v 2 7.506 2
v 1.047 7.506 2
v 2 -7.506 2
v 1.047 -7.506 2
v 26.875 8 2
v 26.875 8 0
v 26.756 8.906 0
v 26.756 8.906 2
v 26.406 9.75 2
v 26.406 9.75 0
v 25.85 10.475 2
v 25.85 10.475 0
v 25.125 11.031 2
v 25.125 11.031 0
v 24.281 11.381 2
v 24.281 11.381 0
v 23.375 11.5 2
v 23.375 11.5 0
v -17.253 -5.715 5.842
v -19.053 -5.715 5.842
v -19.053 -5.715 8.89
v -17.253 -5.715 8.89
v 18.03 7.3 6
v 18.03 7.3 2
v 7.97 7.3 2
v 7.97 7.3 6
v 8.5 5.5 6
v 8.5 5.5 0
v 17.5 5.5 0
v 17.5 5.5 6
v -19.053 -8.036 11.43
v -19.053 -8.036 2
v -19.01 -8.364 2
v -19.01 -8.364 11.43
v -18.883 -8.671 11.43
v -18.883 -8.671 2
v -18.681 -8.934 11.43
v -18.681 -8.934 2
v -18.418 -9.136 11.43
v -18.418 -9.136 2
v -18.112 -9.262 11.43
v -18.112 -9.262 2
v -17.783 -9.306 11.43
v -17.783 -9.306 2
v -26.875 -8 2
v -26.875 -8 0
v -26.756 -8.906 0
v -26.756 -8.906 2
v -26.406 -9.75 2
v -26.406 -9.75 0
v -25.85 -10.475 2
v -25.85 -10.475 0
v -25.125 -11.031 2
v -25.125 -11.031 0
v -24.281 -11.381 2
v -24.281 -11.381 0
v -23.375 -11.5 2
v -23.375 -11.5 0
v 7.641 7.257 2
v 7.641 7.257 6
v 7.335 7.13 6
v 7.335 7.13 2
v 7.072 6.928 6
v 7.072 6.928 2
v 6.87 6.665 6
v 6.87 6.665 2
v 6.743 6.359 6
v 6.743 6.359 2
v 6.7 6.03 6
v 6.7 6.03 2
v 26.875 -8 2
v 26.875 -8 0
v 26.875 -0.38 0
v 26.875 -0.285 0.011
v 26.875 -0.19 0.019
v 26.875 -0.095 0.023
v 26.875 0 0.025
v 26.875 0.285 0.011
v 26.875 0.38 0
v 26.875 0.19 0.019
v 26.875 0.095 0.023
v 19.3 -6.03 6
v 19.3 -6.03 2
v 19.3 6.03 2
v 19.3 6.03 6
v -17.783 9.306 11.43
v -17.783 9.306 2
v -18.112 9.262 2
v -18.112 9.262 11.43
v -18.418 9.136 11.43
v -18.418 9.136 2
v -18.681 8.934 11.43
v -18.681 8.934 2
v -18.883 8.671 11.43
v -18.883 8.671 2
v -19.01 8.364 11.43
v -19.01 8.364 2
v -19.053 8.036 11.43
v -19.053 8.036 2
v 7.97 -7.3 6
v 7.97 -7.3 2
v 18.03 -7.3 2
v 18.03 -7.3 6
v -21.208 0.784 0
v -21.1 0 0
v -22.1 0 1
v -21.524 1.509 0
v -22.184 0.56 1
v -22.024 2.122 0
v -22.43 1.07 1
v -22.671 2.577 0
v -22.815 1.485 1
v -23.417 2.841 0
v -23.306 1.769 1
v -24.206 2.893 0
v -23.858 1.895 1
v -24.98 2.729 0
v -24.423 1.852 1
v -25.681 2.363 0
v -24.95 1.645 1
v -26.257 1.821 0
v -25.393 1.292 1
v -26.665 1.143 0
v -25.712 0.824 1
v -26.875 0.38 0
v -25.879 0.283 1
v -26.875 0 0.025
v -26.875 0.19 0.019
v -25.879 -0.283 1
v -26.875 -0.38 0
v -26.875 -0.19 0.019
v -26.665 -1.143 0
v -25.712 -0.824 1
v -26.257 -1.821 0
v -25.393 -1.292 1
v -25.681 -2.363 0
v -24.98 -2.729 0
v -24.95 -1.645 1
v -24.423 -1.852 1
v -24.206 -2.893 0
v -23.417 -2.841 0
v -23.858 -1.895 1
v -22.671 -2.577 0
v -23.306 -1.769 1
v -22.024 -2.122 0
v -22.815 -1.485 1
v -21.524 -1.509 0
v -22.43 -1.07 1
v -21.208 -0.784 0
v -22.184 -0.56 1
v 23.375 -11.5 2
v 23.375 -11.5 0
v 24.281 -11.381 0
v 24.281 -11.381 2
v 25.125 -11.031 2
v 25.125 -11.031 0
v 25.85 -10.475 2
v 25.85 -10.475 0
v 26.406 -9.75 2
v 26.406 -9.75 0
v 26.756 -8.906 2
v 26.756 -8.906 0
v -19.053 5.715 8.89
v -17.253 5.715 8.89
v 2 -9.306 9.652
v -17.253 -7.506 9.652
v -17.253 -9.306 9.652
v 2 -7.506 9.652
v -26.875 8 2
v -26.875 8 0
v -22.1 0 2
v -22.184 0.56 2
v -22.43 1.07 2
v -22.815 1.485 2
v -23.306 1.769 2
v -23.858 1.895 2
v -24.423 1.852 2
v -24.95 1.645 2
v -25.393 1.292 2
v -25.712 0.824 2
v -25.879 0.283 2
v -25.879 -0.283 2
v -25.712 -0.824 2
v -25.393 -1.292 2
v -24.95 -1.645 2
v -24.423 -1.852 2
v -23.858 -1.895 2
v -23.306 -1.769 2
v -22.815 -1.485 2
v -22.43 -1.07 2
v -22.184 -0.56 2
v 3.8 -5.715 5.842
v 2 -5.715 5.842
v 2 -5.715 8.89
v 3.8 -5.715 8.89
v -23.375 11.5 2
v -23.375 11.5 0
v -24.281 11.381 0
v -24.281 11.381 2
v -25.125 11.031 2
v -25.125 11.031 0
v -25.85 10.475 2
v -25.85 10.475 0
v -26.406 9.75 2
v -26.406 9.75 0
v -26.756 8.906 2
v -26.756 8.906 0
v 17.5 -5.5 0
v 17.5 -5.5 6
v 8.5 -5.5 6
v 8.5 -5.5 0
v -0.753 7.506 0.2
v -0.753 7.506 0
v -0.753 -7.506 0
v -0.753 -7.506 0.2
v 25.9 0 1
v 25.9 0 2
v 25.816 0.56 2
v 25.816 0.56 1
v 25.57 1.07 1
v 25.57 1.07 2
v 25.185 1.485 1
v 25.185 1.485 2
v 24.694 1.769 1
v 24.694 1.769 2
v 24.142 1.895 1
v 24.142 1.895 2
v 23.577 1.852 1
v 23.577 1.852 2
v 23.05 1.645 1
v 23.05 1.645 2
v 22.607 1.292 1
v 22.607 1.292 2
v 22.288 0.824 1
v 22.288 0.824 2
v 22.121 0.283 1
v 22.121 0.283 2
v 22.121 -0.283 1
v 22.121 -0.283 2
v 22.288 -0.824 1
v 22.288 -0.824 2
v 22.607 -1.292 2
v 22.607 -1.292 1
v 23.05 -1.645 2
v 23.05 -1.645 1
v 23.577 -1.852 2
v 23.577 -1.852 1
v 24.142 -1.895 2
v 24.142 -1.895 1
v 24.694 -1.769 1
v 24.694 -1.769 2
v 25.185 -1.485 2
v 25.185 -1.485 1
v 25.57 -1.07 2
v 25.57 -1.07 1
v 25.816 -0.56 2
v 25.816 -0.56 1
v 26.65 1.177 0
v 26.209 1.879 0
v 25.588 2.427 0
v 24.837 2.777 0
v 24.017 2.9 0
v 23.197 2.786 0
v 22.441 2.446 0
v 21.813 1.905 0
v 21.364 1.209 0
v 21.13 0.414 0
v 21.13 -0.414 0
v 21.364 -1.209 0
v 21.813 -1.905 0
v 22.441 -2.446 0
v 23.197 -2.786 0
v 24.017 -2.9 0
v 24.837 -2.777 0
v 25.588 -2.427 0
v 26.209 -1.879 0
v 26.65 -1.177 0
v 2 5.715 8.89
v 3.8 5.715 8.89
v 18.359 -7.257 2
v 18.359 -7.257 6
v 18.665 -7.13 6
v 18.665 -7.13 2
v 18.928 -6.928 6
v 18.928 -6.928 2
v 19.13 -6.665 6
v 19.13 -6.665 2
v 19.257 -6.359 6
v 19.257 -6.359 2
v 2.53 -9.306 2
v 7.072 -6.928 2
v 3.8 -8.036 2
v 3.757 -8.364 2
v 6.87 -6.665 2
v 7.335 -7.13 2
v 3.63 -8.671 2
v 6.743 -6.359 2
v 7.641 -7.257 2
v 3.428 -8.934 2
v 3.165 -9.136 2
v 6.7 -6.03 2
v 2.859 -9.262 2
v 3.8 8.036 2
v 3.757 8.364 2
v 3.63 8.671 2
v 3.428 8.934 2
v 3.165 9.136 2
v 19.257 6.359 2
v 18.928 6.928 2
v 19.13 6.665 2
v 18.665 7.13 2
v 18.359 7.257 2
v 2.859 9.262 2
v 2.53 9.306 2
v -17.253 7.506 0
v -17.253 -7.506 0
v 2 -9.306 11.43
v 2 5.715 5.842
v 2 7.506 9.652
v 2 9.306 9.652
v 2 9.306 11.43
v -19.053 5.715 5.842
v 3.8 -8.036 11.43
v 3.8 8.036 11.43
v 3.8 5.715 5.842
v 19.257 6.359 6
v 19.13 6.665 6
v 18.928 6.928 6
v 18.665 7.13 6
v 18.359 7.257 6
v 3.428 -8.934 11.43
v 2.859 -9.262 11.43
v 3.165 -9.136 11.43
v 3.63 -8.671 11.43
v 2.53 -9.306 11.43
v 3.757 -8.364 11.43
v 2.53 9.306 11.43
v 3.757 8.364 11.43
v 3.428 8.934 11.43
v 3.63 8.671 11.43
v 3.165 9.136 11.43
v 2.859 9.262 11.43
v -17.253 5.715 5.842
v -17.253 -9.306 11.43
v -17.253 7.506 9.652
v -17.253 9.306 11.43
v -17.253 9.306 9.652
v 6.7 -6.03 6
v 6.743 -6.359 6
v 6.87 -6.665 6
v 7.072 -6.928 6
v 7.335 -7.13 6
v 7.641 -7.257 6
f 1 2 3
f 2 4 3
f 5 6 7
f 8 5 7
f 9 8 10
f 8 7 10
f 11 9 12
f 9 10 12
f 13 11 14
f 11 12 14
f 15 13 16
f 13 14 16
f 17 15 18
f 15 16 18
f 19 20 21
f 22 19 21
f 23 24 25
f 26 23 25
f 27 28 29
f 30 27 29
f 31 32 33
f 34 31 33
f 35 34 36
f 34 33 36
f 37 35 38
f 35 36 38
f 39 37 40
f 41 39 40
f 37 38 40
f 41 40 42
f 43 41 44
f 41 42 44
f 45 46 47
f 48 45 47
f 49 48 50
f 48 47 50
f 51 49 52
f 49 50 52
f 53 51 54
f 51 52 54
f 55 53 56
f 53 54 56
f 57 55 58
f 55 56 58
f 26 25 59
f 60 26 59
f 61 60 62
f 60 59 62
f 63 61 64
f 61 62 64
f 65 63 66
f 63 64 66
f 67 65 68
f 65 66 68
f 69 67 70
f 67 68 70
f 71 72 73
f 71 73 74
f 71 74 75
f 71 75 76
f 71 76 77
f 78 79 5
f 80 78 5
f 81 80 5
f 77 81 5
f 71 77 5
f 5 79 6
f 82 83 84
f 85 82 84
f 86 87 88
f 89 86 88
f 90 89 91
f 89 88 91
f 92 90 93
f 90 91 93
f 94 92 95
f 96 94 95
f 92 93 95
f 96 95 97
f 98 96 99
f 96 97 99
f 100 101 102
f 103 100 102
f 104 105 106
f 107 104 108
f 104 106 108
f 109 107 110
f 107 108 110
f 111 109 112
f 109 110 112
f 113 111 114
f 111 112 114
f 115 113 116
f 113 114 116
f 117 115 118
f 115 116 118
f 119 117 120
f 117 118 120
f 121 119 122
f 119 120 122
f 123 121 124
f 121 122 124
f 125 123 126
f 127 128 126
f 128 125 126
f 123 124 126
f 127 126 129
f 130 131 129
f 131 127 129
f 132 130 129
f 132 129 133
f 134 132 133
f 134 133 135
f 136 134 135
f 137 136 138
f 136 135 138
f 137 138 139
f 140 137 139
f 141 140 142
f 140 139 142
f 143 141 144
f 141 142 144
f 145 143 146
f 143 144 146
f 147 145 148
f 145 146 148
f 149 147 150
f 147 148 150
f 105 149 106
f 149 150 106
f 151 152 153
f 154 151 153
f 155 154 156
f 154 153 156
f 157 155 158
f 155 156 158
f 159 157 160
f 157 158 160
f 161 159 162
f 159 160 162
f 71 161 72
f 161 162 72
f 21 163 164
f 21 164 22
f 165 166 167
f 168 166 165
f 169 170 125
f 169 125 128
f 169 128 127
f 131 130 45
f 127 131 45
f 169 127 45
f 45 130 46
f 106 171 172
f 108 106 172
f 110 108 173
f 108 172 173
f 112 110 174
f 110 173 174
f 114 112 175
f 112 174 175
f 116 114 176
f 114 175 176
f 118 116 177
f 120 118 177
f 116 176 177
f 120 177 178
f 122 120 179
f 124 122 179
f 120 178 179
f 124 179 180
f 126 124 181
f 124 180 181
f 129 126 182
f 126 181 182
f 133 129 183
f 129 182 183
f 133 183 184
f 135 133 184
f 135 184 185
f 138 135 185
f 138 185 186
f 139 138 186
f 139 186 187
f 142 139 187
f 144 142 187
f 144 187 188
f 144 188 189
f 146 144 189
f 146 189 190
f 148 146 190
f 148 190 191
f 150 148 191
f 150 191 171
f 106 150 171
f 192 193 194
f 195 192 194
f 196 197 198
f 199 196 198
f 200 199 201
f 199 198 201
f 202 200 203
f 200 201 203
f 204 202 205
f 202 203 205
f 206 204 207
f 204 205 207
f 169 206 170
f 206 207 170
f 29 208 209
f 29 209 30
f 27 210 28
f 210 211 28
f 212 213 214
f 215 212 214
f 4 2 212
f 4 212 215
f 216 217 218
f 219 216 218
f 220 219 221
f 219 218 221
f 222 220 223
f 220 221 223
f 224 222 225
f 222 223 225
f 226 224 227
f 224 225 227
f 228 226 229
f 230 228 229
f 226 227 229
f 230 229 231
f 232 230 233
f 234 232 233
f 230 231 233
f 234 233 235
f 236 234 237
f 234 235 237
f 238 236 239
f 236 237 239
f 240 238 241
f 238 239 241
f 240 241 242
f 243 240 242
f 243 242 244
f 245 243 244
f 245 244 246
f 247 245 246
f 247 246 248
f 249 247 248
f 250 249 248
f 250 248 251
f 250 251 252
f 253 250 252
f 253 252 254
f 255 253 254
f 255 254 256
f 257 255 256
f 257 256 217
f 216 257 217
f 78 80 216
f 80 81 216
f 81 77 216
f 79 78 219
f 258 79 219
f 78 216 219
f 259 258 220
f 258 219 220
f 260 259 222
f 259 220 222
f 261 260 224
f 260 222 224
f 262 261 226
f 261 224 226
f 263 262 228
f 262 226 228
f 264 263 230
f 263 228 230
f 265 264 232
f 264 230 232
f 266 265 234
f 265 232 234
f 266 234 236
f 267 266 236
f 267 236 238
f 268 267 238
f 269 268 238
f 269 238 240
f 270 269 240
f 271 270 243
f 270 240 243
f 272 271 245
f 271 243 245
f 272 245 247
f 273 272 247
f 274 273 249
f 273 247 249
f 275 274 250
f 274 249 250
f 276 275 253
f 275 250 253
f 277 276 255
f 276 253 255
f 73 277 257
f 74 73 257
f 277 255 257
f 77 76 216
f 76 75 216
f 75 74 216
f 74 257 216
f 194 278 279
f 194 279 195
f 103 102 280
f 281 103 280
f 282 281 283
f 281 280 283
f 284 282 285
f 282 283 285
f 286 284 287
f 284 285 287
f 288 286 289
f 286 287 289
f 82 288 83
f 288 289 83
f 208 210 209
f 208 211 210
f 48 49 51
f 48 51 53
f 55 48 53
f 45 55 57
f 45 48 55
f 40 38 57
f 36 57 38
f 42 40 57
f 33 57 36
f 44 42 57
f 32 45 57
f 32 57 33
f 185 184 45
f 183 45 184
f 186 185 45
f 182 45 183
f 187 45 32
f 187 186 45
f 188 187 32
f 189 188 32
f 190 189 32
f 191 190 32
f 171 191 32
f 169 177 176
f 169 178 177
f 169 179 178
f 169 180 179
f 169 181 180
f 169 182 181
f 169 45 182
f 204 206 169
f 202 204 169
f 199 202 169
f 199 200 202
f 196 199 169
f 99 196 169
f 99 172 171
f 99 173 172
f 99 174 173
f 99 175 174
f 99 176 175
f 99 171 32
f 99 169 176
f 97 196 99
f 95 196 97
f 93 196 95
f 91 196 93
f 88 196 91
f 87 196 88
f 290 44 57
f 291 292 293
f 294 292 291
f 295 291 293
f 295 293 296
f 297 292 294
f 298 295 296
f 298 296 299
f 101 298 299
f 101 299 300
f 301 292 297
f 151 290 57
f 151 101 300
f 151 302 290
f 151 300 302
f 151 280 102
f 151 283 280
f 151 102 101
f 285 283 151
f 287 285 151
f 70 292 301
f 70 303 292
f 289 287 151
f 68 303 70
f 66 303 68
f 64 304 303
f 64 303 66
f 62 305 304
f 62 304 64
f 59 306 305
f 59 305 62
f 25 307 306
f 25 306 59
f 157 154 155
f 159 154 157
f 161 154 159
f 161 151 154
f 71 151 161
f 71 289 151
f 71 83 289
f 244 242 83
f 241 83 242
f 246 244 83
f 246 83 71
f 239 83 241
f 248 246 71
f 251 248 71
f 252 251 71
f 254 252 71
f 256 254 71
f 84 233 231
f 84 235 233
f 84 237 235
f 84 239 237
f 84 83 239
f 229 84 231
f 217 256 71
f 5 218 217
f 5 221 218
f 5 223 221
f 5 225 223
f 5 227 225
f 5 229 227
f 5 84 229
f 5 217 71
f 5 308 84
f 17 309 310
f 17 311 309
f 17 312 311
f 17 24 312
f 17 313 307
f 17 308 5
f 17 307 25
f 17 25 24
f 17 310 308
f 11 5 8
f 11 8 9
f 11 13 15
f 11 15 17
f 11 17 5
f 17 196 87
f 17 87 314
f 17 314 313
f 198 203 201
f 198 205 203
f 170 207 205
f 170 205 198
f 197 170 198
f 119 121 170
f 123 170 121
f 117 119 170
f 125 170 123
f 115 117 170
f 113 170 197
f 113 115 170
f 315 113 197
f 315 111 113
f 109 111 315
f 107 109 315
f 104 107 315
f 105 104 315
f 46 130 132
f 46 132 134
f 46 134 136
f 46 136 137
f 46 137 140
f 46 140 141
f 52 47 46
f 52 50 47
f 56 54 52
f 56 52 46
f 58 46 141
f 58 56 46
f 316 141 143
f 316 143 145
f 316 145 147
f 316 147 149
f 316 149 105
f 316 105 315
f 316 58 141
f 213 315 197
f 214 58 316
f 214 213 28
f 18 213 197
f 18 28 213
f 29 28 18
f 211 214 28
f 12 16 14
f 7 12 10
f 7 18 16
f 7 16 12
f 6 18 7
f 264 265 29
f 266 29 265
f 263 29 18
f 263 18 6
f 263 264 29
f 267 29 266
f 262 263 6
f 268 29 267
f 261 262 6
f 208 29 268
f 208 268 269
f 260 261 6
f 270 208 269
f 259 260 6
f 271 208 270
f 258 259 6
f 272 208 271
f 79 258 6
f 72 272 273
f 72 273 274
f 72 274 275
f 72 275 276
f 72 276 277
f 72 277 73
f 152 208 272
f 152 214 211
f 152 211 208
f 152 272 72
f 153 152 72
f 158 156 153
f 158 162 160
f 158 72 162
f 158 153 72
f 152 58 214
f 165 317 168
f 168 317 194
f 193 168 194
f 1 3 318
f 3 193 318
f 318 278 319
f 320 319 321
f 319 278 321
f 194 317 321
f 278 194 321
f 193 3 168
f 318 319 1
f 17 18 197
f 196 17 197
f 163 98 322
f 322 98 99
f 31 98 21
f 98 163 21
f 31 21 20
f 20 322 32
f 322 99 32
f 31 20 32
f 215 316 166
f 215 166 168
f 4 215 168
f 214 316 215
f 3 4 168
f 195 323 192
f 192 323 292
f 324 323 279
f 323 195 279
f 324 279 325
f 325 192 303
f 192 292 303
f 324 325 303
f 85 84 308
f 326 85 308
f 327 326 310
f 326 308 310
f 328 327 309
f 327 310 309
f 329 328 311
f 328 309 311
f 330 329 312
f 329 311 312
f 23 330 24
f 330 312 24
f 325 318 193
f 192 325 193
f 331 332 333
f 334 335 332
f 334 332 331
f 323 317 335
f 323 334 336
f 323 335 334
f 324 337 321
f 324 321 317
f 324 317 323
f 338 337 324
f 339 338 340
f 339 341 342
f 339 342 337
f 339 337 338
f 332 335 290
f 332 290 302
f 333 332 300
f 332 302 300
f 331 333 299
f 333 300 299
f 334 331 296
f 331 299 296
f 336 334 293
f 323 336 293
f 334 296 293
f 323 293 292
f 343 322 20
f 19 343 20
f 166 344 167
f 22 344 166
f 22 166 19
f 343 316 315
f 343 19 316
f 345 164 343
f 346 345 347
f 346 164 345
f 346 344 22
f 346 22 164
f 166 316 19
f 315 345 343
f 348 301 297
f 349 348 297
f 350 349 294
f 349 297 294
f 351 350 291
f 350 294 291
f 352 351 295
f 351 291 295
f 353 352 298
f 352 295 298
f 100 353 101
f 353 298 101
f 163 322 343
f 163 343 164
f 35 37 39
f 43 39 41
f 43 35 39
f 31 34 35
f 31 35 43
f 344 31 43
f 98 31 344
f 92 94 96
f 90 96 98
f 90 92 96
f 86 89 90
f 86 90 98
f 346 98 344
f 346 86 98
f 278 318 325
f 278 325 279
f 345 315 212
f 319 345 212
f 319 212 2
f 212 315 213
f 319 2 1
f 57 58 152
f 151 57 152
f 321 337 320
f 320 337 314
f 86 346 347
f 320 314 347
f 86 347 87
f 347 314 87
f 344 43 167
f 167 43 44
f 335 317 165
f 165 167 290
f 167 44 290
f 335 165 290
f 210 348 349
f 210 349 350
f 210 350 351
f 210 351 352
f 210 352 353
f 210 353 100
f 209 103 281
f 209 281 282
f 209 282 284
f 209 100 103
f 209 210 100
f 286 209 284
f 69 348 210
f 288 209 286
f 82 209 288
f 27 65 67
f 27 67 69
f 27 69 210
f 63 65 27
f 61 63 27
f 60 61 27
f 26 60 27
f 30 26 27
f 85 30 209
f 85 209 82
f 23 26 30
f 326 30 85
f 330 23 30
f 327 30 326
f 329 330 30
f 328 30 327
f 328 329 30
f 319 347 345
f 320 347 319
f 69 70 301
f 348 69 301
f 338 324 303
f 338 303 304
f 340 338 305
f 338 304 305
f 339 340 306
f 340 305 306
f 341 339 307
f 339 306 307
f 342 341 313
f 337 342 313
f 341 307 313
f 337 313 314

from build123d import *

# Parameters (mm, degrees)
F1_DEPTH  = 2
F2_R      = 1.9
F3_DEPTH  = 2.001
F5_W      = 19.2532
F5_H      = 15.0114
F6_DEPTH  = 2.001
F7_W      = 19.2532
F7_H      = 15.0114
F8_DEPTH  = 9.43
F9_W      = 11.43
F9_H      = 3.048
F10_DEPTH = 45.9292
F11_W     = 19.2532
F11_H     = 18.6114
F12_DEPTH = 1.778
F13_W     = 2.7532
F13_H     = 15.0114
F14_DEPTH = 2
F15_SIZE  = 1.8
F16_W     = 9
F16_H     = 11
F17_DEPTH = 2.001
F18_W     = 9
F18_H     = 11
F19_DEPTH = 4


# Not quite as in the source:
# - a fillet or chamfer that OpenCascade refuses, or shapes differently, is made with other operations: its cross-section is extruded or revolved along the edge and cut away or added


with BuildPart() as f1:
    # F0 (on Top) → F1 (new body)
    with BuildSketch(Plane.XY):
        with BuildLine():
            ThreePointArc((26.875, 8), (25.8498737342, 10.4748737342), (23.375, 11.5))
            Line((23.375, 11.5), (-23.375, 11.5))
            ThreePointArc((-23.375, 11.5), (-25.8498737342, 10.4748737342), (-26.875, 8))
            Line((-26.875, 8), (-26.875, -8))
            ThreePointArc((-26.875, -8), (-25.8498737342, -10.4748737342), (-23.375, -11.5))
            Line((-23.375, -11.5), (23.375, -11.5))
            ThreePointArc((23.375, -11.5), (25.8498737342, -10.4748737342), (26.875, -8))
            Line((26.875, -8), (26.875, 8))
        make_face()
    extrude(amount=F1_DEPTH)

    # F2 (on face) → F3 (cut, through all)
    with BuildSketch(Plane.XY.offset(2)):
        with Locations((-24, 0)):
            Circle(F2_R)
        with Locations((24, 0)):
            Circle(F2_R)
    extrude(amount=-F3_DEPTH, mode=Mode.SUBTRACT)

    # F4: chamfer of 1 on 2 edges, made by hand

    # F4_s1 → F4_t2 (revolve, cut)
    with BuildSketch(Plane.XZ):
        Polygon((-21.1, 0), (-22.1, 1), (-22.1, 0), align=None)
    revolve(axis=Axis((-24, 0, 0), (0, 0, 1)), mode=Mode.SUBTRACT)

    # F4_s3 → F4_t4 (revolve, cut)
    with BuildSketch(Plane.XZ):
        Polygon((26.9, 0), (25.9, 1), (25.9, 0), align=None)
    revolve(axis=Axis((24, 0, 0), (0, 0, 1)), mode=Mode.SUBTRACT)

    # F5 (on face) → F6 (cut, through all)
    with BuildSketch(Plane.XY.offset(2)):
        with Locations((-7.6266, 0)):
            Rectangle(F5_W, F5_H)
    extrude(amount=-F6_DEPTH, mode=Mode.SUBTRACT)

    # F7 (on face) → F8 (join)
    with BuildSketch(Plane.XY.offset(2)):
        with BuildLine():
            ThreePointArc((3.8, 8.0357), (3.4280256121, 8.9337256121), (2.53, 9.3057))
            Line((2.53, 9.3057), (-17.7832, 9.3057))
            ThreePointArc((-17.7832, 9.3057), (-18.6812256121, 8.9337256121), (-19.0532, 8.0357))
            Line((-19.0532, 8.0357), (-19.0532, -8.0357))
            ThreePointArc((-19.0532, -8.0357), (-18.6812256121, -8.9337256121), (-17.7832, -9.3057))
            Line((-17.7832, -9.3057), (2.53, -9.3057))
            ThreePointArc((2.53, -9.3057), (3.4280256121, -8.9337256121), (3.8, -8.0357))
            Line((3.8, -8.0357), (3.8, 8.0357))
        make_face()
        with Locations((-7.6266, 0)):
            Rectangle(F7_W, F7_H, mode=Mode.SUBTRACT)
    extrude(amount=F8_DEPTH)

    # F9 (on face) → F10 (cut, through all)
    with BuildSketch(Plane(origin=(-19.0532, 0, 0), x_dir=(0, -1, 0), z_dir=(-1, 0, 0))):
        with Locations((0, 7.366)):
            Rectangle(F9_W, F9_H)
    extrude(amount=-F10_DEPTH, mode=Mode.SUBTRACT)

    # F11 (on face) → F12 (cut)
    with BuildSketch(Plane.XY.offset(11.43)):
        with Locations((-7.6266, 0)):
            Rectangle(F11_W, F11_H)
    extrude(amount=-F12_DEPTH, mode=Mode.SUBTRACT)

    # F13 (on face) → F14 (join)
    with BuildSketch(Plane(origin=(0, 0, 0), x_dir=(1, 0, 0), z_dir=(0, 0, -1))):
        with Locations((0.6234, 0)):
            Rectangle(F13_W, F13_H)
    extrude(amount=-F14_DEPTH)

    # F15
    f15_edges = [f1.edges().sort_by_distance(p)[0] for p in [
        (-0.7532, 0, 2),
    ]]
    chamfer(f15_edges, length=F15_SIZE)

    # F16 (on face) → F17 (cut, through all)
    with BuildSketch(Plane.XY.offset(2)):
        with Locations((13, 0)):
            Rectangle(F16_W, F16_H)
    extrude(amount=-F17_DEPTH, mode=Mode.SUBTRACT)

    # F18 (on face) → F19 (join)
    with BuildSketch(Plane.XY.offset(2)):
        with BuildLine():
            ThreePointArc((18.03, -7.3), (18.9280256121, -6.9280256121), (19.3, -6.03))
            Line((19.3, -6.03), (19.3, 6.03))
            ThreePointArc((19.3, 6.03), (18.9280256121, 6.9280256121), (18.03, 7.3))
            Line((18.03, 7.3), (7.97, 7.3))
            ThreePointArc((7.97, 7.3), (7.0719743879, 6.9280256121), (6.7, 6.03))
            Line((6.7, 6.03), (6.7, -6.03))
            ThreePointArc((6.7, -6.03), (7.0719743879, -6.9280256121), (7.97, -7.3))
            Line((7.97, -7.3), (18.03, -7.3))
        make_face()
        with Locations((13, 0)):
            Rectangle(F18_W, F18_H, mode=Mode.SUBTRACT)
    extrude(amount=F19_DEPTH)


solid = f1.part
